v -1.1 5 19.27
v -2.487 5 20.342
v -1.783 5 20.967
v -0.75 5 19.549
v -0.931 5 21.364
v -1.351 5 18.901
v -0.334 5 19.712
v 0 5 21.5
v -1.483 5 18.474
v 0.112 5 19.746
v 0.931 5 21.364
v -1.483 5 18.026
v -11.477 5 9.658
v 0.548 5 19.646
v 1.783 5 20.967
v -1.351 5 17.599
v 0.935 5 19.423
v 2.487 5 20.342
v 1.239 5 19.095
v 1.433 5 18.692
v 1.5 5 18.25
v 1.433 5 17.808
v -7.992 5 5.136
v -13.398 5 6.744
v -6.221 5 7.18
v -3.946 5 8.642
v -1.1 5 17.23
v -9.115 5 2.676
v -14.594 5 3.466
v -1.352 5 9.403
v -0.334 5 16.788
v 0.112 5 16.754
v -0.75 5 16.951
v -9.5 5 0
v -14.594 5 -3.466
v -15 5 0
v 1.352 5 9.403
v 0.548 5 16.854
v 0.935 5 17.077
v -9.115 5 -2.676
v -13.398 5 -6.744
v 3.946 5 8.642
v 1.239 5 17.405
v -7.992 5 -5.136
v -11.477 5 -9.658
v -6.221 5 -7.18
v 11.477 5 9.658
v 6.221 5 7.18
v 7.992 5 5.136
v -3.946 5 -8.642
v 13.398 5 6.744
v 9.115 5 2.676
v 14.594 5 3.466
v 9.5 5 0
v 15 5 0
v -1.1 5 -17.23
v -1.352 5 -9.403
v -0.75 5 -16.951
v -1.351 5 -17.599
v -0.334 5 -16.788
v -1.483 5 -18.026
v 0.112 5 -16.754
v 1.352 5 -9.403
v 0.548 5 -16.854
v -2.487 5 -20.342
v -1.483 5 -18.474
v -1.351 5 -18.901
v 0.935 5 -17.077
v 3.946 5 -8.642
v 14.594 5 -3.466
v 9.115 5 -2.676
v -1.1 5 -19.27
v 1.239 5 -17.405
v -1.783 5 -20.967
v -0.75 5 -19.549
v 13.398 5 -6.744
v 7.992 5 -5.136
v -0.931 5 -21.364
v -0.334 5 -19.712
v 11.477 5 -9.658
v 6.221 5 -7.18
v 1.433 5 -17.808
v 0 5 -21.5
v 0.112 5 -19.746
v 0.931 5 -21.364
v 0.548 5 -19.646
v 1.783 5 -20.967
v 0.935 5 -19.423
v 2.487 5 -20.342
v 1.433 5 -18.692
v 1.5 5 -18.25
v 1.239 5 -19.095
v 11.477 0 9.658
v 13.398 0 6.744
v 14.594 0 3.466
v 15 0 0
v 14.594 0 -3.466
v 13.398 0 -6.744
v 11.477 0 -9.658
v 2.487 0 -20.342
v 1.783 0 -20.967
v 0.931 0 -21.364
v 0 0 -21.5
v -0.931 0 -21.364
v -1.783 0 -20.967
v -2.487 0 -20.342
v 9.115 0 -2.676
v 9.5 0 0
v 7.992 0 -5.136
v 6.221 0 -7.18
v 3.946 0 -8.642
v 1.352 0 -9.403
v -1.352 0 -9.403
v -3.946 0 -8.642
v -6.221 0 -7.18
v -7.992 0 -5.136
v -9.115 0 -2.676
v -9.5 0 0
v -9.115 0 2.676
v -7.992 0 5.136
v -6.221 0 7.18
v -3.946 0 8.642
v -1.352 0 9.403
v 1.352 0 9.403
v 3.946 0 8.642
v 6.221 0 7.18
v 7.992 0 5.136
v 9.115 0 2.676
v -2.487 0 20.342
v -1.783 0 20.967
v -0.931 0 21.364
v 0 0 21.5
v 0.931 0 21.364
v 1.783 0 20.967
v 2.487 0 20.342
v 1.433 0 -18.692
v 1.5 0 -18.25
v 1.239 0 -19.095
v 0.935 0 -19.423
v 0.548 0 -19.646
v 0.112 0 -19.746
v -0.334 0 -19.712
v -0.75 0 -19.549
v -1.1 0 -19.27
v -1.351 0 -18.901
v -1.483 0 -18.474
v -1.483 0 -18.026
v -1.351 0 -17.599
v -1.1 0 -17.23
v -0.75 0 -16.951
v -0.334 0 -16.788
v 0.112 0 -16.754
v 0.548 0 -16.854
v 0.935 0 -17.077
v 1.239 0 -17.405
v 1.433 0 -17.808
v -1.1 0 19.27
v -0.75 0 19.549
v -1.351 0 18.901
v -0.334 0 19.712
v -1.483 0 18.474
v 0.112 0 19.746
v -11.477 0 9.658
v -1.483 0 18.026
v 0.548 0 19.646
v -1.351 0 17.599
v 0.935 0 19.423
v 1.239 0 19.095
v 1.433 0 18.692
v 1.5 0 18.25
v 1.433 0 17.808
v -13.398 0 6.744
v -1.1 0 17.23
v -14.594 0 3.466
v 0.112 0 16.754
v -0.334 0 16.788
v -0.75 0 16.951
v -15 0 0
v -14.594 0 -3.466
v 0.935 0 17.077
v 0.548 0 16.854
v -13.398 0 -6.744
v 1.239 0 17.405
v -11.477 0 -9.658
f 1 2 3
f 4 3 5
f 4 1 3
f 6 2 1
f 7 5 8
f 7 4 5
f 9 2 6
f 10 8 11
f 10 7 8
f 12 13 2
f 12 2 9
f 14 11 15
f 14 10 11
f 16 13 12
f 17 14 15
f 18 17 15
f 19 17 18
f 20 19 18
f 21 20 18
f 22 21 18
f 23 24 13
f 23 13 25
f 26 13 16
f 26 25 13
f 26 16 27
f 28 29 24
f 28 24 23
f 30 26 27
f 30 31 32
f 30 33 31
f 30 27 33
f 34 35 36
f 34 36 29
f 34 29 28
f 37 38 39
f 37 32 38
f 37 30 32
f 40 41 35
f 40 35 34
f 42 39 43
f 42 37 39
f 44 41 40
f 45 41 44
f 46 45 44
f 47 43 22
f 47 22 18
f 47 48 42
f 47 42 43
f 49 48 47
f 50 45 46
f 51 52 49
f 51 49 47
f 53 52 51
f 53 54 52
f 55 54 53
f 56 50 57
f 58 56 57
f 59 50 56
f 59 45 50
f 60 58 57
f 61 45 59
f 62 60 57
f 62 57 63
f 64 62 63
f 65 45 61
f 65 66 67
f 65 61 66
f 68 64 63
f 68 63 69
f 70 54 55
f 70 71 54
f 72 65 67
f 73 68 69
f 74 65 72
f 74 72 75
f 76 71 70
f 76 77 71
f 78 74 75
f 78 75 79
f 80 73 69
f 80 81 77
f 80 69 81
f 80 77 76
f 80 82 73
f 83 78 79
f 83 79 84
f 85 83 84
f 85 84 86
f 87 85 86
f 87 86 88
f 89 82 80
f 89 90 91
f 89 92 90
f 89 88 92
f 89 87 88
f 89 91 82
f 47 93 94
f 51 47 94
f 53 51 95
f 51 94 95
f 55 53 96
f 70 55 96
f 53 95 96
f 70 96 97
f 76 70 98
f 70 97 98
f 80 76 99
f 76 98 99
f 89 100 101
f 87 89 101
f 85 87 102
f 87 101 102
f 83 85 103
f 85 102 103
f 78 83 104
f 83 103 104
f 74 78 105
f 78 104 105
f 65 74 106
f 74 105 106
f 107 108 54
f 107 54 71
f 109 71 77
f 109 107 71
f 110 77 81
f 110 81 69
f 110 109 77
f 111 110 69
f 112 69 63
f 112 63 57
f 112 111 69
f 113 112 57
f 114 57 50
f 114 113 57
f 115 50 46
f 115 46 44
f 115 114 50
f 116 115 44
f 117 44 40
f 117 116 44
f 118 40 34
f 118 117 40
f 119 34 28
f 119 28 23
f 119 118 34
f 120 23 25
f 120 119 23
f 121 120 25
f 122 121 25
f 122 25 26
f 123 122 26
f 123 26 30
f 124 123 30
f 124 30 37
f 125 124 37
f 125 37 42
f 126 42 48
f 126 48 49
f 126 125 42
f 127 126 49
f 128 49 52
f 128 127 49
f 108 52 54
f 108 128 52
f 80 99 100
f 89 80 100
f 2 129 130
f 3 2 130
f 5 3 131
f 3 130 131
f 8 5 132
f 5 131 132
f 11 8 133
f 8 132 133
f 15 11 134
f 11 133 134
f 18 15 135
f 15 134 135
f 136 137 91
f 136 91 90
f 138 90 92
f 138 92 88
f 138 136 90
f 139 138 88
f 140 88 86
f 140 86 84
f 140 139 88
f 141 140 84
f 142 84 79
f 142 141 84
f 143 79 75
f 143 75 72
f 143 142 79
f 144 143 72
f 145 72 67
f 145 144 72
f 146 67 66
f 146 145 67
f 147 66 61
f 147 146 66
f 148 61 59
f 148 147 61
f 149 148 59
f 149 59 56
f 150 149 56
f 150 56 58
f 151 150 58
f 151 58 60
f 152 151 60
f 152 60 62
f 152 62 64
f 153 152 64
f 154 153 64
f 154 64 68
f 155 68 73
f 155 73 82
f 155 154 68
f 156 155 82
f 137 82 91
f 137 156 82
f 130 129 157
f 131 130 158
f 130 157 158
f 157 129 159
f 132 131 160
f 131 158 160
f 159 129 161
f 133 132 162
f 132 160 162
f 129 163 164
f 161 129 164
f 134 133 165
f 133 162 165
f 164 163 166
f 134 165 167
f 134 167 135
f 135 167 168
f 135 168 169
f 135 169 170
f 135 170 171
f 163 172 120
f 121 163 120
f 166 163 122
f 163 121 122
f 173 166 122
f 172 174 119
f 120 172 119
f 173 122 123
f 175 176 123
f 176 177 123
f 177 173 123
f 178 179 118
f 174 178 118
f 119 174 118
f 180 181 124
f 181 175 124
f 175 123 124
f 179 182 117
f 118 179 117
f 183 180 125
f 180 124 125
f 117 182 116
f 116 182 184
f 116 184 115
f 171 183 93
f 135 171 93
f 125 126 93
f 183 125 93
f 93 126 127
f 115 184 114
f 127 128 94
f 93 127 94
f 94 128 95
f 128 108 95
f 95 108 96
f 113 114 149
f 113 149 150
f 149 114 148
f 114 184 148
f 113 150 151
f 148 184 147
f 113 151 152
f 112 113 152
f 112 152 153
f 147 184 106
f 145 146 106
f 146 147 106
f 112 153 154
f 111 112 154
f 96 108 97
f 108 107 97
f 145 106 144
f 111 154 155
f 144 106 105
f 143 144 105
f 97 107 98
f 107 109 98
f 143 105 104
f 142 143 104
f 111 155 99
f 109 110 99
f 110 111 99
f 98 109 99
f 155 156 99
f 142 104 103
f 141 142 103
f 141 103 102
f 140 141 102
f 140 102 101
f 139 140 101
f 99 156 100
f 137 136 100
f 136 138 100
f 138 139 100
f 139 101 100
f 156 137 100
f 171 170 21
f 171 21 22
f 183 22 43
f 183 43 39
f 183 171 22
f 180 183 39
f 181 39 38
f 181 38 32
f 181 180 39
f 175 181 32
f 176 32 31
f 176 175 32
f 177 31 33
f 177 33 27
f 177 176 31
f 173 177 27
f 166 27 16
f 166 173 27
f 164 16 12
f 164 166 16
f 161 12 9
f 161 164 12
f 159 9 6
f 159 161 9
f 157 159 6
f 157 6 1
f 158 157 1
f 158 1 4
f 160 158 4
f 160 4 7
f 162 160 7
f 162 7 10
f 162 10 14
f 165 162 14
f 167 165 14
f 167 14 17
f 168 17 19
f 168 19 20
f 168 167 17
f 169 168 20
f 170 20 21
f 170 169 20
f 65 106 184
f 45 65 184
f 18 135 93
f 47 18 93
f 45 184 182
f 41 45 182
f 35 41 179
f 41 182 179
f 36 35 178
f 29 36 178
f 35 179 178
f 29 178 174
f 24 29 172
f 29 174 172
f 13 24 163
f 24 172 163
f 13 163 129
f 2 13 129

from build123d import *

# Parameters (mm, degrees)
SKETCH1_R           = 1.5
SKETCH1_R_2         = 9.5
BOSS_EXTRUDE1_DEPTH = 5


with BuildPart() as part:
    # Sketch1 → Boss-Extrude1 (new body)
    with BuildSketch(Plane(origin=(0, 0, 0), x_dir=(1, 0, 0), z_dir=(0, 1, 0))):
        with BuildLine():
            Line((-11.47745757, -9.657534247), (-2.486782474, -20.342465753))
            ThreePointArc((-2.486782474, -20.342465753), (0, -21.5), (2.486782474, -20.342465753))
            Line((2.486782474, -20.342465753), (11.47745757, -9.657534247))
            ThreePointArc((11.47745757, -9.657534247), (15, 0), (11.47745757, 9.657534247))
            Line((11.47745757, 9.657534247), (2.486782474, 20.342465753))
            ThreePointArc((2.486782474, 20.342465753), (0, 21.5), (-2.486782474, 20.342465753))
            Line((-2.486782474, 20.342465753), (-11.47745757, 9.657534247))
            ThreePointArc((-11.47745757, 9.657534247), (-15, 0), (-11.47745757, -9.657534247))
        make_face()
        with Locations((0, -18.25)):
            Circle(SKETCH1_R, mode=Mode.SUBTRACT)
        Circle(SKETCH1_R_2, mode=Mode.SUBTRACT)
        with Locations((0, 18.25)):
            Circle(SKETCH1_R, mode=Mode.SUBTRACT)
    extrude(amount=BOSS_EXTRUDE1_DEPTH)


solid = part.part
